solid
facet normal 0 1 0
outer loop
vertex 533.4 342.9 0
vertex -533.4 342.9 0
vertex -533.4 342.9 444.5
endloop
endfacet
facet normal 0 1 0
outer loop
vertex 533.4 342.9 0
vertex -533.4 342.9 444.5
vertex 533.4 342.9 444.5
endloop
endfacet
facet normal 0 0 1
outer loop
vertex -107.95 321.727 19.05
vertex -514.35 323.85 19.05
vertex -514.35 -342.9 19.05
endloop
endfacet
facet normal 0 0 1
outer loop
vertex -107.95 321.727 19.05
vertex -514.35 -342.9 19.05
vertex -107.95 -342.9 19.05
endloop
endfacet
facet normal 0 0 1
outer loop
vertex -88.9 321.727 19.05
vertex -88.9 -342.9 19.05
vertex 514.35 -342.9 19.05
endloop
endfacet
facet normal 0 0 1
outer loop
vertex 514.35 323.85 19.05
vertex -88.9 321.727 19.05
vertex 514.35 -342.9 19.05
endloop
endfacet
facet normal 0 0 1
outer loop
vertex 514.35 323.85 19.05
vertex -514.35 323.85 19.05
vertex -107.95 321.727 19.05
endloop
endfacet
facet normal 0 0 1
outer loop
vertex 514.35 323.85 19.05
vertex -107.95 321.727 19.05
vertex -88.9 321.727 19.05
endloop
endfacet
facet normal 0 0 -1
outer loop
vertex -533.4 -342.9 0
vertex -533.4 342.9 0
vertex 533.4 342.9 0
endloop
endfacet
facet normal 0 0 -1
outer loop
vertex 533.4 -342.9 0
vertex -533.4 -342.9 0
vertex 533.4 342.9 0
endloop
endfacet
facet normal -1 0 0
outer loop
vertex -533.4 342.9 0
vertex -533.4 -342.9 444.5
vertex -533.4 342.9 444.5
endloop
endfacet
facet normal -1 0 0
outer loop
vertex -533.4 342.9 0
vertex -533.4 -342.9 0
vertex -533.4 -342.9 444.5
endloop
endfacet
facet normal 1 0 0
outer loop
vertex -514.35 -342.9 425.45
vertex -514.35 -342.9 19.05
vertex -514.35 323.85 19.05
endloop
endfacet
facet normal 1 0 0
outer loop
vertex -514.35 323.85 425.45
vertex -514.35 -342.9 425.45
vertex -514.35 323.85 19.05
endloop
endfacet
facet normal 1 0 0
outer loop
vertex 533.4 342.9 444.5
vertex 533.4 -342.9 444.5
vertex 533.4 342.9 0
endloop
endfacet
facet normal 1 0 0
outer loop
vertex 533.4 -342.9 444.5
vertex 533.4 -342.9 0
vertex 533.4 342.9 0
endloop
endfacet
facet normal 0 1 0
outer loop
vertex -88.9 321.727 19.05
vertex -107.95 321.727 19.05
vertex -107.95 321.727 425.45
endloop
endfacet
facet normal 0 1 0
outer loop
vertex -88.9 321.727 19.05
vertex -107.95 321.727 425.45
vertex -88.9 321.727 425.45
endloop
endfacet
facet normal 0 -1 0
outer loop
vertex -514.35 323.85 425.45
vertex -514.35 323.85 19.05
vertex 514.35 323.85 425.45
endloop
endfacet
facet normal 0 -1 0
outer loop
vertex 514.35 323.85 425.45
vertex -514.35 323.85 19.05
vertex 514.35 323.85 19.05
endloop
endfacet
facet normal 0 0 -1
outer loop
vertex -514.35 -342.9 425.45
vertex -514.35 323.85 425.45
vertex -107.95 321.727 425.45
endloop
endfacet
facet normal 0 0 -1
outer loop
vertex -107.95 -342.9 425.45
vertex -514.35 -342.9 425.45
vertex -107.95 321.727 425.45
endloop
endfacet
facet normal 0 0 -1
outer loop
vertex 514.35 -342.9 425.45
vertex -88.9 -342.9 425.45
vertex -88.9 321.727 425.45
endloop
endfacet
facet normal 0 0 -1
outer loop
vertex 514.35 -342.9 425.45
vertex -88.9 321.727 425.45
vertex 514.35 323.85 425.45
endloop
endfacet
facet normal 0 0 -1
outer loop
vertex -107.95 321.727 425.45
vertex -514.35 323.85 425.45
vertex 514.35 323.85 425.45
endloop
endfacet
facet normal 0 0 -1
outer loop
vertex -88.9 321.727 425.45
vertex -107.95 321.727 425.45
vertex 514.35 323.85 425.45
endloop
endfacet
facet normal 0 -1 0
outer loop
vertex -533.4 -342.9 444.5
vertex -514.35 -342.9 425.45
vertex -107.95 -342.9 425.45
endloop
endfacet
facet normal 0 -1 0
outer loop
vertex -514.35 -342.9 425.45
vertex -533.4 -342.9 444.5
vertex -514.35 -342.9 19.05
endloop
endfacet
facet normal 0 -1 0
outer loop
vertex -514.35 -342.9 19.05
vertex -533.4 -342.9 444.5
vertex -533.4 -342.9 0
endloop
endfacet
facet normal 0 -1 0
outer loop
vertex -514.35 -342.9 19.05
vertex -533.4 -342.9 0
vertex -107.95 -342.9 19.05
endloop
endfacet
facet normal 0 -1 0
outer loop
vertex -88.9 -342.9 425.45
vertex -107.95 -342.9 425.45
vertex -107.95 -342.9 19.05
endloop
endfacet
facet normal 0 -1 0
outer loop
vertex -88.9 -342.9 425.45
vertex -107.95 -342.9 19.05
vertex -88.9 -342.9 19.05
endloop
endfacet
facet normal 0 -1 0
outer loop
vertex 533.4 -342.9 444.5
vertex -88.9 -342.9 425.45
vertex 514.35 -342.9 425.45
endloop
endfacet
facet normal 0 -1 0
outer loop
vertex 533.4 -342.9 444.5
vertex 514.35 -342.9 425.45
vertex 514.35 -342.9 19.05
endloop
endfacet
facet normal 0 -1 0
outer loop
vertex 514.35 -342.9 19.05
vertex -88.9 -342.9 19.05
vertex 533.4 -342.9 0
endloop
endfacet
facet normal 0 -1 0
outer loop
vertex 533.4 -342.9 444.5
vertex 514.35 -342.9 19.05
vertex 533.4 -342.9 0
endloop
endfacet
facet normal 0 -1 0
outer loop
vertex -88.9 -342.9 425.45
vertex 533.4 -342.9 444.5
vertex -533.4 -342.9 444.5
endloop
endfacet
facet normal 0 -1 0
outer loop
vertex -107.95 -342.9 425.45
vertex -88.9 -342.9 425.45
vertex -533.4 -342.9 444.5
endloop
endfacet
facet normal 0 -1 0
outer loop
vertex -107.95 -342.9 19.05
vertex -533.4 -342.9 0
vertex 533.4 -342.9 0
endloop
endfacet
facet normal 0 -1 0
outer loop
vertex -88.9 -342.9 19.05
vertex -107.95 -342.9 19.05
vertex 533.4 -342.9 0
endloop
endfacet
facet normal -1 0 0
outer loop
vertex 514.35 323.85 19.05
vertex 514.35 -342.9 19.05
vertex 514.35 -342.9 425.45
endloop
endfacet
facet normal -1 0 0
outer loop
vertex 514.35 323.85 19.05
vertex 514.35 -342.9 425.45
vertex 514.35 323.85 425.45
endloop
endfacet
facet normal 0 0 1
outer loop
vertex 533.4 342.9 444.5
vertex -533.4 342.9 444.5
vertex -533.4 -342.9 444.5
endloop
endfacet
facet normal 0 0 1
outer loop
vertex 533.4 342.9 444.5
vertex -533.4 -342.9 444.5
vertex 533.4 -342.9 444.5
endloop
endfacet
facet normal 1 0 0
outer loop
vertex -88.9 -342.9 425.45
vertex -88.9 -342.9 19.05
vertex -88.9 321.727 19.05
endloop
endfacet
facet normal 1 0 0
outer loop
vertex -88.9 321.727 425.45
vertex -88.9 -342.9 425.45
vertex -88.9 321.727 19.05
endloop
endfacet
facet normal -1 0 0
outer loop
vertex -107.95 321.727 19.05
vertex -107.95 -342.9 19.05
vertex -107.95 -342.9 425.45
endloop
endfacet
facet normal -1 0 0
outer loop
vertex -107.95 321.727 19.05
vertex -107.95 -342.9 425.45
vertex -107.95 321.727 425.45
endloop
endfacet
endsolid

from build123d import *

# Parameters (mm, degrees)
F0_W     = 1066.8
F0_H     = 685.8
F1_DEPTH = 19.05
F2_W     = 19.05
F2_H     = 666.75
F2_H_2   = 664.6272460461
F3_DEPTH = 406.4
F5_W     = 1066.8
F5_H     = 685.8
F6_DEPTH = 19.05


with BuildPart() as f1:
    # F0 (on Top) → F1 (new body)
    with BuildSketch(Plane.XY):
        Rectangle(F0_W, F0_H)
    extrude(amount=F1_DEPTH)

    # F2 (on face) → F3 (join)
    with BuildSketch(Plane.XY.offset(19.05)):
        with Locations((-523.875, -9.525)):
            Rectangle(F2_W, F2_H)
        Polygon((-533.4, 323.85), (-514.35, 323.85), (514.35, 323.85), (533.4, 323.85), (533.4, 342.9), (-533.4, 342.9), align=None)
        with Locations((523.875, -9.525)):
            Rectangle(F2_W, F2_H)
        with Locations((-98.425, -10.586376977)):
            Rectangle(F2_W, F2_H_2)
    extrude(amount=F3_DEPTH)

    # F5 (on offset) → F6 (join)
    with BuildSketch(Plane.XY.offset(425.45)):
        Rectangle(F5_W, F5_H)
    extrude(amount=F6_DEPTH)


solid = f1.part
